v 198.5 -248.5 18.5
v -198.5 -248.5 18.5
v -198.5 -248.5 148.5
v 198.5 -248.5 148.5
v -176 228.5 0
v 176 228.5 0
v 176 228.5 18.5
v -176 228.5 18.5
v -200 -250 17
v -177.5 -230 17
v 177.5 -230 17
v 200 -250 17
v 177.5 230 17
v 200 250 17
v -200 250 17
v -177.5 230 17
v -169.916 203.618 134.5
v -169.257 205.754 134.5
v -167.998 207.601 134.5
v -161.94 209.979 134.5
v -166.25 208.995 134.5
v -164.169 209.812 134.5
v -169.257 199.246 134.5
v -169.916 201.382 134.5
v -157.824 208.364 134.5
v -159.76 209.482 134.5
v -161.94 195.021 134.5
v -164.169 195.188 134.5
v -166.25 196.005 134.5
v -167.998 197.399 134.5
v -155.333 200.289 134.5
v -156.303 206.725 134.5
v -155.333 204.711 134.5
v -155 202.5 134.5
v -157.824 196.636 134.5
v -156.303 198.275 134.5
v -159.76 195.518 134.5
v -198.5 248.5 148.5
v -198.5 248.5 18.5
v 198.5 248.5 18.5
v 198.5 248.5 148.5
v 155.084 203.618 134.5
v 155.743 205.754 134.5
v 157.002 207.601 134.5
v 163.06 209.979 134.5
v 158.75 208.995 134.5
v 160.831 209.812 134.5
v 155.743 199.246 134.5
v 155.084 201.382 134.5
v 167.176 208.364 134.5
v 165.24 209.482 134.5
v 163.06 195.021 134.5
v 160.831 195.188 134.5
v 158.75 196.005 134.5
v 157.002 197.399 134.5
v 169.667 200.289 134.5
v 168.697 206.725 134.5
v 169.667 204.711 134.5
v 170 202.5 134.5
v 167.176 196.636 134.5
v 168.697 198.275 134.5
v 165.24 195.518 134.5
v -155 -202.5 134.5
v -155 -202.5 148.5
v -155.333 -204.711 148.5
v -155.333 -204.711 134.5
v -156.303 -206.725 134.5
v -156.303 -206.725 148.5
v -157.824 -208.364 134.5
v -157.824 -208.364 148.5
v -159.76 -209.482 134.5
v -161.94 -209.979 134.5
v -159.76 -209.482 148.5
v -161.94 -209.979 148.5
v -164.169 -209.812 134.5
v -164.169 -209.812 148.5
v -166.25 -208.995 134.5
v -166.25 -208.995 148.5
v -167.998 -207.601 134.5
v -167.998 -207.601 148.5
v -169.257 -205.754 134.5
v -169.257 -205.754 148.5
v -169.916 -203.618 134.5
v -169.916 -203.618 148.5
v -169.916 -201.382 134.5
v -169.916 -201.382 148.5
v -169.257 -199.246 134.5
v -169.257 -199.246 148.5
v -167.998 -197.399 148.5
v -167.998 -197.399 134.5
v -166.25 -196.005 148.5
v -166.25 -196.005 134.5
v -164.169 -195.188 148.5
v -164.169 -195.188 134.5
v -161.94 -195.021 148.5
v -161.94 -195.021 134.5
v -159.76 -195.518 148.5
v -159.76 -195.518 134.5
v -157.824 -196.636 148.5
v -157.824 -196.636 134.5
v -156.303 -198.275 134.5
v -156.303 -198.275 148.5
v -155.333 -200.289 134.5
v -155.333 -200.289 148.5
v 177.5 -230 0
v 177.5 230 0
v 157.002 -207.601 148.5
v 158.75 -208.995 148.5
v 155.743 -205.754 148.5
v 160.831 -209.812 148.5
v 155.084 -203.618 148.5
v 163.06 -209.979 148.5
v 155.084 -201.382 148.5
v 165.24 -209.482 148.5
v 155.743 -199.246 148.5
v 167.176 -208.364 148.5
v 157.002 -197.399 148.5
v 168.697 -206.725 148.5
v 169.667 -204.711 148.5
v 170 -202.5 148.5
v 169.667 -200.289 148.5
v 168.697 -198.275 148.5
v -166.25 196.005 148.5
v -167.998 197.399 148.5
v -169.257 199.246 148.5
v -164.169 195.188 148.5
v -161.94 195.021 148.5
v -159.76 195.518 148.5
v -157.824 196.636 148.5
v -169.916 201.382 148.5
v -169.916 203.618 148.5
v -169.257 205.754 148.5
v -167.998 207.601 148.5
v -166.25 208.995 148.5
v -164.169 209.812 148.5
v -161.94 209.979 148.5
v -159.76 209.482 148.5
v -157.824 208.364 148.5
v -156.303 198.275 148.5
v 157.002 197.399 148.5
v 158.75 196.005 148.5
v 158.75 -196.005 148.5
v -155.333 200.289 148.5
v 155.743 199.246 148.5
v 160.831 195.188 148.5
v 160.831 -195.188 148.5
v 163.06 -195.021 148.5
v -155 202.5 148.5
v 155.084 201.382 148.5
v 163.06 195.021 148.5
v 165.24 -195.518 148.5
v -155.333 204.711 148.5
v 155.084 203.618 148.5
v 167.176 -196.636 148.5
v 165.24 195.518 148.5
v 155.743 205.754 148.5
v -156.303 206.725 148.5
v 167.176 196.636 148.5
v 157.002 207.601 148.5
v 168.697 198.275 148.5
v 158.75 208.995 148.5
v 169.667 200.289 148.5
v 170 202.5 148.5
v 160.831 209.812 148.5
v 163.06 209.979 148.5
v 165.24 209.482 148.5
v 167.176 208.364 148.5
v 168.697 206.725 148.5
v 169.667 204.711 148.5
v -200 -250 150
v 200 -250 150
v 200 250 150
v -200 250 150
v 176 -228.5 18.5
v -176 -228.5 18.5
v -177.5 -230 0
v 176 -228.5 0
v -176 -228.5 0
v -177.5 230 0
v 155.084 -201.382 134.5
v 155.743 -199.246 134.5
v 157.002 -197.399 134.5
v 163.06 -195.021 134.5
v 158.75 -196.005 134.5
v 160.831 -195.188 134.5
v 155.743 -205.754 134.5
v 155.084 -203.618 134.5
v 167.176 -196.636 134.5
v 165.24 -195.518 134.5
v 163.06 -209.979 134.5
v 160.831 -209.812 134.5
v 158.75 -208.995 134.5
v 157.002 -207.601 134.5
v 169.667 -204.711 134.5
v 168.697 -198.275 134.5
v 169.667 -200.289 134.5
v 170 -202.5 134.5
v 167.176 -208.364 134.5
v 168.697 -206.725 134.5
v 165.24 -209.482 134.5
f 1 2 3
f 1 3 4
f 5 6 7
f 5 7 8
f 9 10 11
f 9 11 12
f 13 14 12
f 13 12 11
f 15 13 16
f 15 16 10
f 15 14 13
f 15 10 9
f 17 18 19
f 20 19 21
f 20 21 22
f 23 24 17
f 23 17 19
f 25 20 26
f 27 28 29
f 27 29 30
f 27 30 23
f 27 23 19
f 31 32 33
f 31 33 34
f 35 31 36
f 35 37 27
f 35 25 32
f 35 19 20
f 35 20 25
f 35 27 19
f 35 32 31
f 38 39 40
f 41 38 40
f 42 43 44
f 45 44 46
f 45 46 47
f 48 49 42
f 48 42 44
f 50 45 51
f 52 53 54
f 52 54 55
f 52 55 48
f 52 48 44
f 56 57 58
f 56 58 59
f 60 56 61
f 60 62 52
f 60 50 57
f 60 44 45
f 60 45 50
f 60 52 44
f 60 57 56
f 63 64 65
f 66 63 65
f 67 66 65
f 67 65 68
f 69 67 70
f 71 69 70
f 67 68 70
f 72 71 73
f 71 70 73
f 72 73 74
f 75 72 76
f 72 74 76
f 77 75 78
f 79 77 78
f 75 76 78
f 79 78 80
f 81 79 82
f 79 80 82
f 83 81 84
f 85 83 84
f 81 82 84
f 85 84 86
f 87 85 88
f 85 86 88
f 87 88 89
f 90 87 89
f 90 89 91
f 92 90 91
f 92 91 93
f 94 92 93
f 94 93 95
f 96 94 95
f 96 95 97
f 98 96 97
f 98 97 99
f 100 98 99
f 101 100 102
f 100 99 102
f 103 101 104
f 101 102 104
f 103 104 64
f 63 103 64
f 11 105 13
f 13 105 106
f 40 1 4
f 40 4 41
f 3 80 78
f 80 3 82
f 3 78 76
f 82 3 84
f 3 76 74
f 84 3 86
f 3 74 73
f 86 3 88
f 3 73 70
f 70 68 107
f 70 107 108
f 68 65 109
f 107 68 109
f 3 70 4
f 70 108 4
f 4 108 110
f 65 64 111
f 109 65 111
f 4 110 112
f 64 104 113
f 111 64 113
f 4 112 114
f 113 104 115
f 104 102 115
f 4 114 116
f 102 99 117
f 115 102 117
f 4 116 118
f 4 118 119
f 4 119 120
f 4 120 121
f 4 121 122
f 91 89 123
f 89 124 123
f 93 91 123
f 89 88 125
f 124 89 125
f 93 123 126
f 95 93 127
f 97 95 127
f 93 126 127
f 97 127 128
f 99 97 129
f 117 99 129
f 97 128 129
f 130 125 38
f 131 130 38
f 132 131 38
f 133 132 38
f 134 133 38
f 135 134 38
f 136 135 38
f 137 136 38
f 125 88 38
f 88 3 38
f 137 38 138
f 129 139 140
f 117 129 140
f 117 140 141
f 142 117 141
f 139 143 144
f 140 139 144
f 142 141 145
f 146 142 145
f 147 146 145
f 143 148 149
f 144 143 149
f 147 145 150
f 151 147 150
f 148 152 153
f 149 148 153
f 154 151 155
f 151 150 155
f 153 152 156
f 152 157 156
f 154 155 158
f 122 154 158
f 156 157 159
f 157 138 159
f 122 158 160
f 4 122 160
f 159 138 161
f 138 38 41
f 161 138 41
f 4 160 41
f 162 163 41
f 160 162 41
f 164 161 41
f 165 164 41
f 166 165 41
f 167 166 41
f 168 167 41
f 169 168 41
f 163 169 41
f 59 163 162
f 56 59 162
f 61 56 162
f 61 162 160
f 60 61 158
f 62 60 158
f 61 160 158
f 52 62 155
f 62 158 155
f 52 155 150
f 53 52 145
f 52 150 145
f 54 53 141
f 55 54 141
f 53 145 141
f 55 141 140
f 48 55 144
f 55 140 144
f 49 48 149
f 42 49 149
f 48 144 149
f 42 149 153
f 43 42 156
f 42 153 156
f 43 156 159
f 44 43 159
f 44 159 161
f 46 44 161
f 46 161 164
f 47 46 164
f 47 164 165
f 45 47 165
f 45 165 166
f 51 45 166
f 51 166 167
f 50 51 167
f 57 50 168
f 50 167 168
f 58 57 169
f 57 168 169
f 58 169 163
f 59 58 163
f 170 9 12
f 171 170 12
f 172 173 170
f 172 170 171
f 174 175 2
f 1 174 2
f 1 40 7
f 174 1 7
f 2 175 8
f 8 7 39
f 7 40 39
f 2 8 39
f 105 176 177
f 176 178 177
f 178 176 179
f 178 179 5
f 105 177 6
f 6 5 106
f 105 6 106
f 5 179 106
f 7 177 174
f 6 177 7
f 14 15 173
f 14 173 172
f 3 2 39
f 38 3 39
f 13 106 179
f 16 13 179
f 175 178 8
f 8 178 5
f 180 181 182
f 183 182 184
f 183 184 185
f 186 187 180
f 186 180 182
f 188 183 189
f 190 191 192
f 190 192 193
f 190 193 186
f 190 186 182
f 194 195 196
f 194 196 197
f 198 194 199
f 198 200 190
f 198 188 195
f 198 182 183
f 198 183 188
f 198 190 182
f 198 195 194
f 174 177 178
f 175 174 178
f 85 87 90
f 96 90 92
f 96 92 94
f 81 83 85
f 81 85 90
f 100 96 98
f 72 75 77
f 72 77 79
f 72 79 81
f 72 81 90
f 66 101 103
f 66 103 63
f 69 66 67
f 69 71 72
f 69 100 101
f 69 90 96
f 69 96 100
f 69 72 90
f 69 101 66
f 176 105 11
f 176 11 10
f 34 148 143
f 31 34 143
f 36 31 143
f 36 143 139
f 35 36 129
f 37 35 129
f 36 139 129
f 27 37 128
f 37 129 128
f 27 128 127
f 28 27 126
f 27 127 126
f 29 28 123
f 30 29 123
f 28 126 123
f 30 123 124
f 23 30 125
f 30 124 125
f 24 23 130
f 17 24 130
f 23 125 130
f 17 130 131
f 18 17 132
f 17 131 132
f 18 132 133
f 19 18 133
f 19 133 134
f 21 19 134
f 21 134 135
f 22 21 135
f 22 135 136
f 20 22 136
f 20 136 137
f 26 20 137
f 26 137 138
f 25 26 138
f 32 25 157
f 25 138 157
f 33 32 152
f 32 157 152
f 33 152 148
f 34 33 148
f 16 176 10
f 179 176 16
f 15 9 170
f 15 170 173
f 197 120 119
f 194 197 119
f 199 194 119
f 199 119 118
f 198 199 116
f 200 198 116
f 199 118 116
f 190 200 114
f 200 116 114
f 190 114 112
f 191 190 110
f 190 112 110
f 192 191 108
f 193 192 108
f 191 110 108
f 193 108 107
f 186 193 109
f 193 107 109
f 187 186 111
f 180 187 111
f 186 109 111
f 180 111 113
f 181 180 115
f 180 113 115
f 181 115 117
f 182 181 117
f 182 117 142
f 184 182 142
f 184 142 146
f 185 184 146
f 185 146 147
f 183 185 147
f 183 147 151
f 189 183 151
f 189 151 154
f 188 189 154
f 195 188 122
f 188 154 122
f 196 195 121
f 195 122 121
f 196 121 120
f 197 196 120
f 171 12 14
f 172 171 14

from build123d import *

# Parameters (mm, degrees)
SKETCH1_W           = 400
SKETCH1_H           = 500
BOSS_EXTRUDE1_DEPTH = 150
SKETCH2_W           = 400
SKETCH2_H           = 500
SKETCH2_W_2         = 355
SKETCH2_H_2         = 460
CUT_EXTRUDE1_DEPTH  = 17
SHELL1_T            = -1.5
SKETCH3_R           = 7.5
BOSS_EXTRUDE2_DEPTH = 14


with BuildPart() as part:
    # Sketch1 → Boss-Extrude1 (new body)
    with BuildSketch(Plane.XY):
        Rectangle(SKETCH1_W, SKETCH1_H)
    extrude(amount=BOSS_EXTRUDE1_DEPTH)

    # Sketch2 → Cut-Extrude1 (cut)
    with BuildSketch(Plane(origin=(0, 0, 0), x_dir=(-1, 0, 0), z_dir=(0, 0, -1))):
        Rectangle(SKETCH2_W, SKETCH2_H)
        Rectangle(SKETCH2_W_2, SKETCH2_H_2, mode=Mode.SUBTRACT)
    extrude(amount=-CUT_EXTRUDE1_DEPTH, mode=Mode.SUBTRACT)

    # Shell1
    shell1_openings = [part.faces().sort_by_distance(p)[0] for p in [
        (0, 0, 0),
    ]]
    offset(amount=SHELL1_T, openings=shell1_openings, kind=Kind.INTERSECTION)

    # Sketch3 → Boss-Extrude2 (add)
    with BuildSketch(Plane(origin=(0, 0, 148.5), x_dir=(-1, 0, 0), z_dir=(0, 0, -1))):
        with Locations(Location((-162.5, 202.5, 0), (0, 0, 180))):
            Circle(SKETCH3_R)
        with Locations(Location((162.5, 202.5, 0), (0, 0, 180))):
            Circle(SKETCH3_R)
        with Locations(Location((162.5, -202.5, 0), (0, 0, 180))):
            Circle(SKETCH3_R)
        with Locations(Location((-162.5, -202.5, 0), (0, 0, 180))):
            Circle(SKETCH3_R)
    extrude(amount=BOSS_EXTRUDE2_DEPTH)


solid = part.part
